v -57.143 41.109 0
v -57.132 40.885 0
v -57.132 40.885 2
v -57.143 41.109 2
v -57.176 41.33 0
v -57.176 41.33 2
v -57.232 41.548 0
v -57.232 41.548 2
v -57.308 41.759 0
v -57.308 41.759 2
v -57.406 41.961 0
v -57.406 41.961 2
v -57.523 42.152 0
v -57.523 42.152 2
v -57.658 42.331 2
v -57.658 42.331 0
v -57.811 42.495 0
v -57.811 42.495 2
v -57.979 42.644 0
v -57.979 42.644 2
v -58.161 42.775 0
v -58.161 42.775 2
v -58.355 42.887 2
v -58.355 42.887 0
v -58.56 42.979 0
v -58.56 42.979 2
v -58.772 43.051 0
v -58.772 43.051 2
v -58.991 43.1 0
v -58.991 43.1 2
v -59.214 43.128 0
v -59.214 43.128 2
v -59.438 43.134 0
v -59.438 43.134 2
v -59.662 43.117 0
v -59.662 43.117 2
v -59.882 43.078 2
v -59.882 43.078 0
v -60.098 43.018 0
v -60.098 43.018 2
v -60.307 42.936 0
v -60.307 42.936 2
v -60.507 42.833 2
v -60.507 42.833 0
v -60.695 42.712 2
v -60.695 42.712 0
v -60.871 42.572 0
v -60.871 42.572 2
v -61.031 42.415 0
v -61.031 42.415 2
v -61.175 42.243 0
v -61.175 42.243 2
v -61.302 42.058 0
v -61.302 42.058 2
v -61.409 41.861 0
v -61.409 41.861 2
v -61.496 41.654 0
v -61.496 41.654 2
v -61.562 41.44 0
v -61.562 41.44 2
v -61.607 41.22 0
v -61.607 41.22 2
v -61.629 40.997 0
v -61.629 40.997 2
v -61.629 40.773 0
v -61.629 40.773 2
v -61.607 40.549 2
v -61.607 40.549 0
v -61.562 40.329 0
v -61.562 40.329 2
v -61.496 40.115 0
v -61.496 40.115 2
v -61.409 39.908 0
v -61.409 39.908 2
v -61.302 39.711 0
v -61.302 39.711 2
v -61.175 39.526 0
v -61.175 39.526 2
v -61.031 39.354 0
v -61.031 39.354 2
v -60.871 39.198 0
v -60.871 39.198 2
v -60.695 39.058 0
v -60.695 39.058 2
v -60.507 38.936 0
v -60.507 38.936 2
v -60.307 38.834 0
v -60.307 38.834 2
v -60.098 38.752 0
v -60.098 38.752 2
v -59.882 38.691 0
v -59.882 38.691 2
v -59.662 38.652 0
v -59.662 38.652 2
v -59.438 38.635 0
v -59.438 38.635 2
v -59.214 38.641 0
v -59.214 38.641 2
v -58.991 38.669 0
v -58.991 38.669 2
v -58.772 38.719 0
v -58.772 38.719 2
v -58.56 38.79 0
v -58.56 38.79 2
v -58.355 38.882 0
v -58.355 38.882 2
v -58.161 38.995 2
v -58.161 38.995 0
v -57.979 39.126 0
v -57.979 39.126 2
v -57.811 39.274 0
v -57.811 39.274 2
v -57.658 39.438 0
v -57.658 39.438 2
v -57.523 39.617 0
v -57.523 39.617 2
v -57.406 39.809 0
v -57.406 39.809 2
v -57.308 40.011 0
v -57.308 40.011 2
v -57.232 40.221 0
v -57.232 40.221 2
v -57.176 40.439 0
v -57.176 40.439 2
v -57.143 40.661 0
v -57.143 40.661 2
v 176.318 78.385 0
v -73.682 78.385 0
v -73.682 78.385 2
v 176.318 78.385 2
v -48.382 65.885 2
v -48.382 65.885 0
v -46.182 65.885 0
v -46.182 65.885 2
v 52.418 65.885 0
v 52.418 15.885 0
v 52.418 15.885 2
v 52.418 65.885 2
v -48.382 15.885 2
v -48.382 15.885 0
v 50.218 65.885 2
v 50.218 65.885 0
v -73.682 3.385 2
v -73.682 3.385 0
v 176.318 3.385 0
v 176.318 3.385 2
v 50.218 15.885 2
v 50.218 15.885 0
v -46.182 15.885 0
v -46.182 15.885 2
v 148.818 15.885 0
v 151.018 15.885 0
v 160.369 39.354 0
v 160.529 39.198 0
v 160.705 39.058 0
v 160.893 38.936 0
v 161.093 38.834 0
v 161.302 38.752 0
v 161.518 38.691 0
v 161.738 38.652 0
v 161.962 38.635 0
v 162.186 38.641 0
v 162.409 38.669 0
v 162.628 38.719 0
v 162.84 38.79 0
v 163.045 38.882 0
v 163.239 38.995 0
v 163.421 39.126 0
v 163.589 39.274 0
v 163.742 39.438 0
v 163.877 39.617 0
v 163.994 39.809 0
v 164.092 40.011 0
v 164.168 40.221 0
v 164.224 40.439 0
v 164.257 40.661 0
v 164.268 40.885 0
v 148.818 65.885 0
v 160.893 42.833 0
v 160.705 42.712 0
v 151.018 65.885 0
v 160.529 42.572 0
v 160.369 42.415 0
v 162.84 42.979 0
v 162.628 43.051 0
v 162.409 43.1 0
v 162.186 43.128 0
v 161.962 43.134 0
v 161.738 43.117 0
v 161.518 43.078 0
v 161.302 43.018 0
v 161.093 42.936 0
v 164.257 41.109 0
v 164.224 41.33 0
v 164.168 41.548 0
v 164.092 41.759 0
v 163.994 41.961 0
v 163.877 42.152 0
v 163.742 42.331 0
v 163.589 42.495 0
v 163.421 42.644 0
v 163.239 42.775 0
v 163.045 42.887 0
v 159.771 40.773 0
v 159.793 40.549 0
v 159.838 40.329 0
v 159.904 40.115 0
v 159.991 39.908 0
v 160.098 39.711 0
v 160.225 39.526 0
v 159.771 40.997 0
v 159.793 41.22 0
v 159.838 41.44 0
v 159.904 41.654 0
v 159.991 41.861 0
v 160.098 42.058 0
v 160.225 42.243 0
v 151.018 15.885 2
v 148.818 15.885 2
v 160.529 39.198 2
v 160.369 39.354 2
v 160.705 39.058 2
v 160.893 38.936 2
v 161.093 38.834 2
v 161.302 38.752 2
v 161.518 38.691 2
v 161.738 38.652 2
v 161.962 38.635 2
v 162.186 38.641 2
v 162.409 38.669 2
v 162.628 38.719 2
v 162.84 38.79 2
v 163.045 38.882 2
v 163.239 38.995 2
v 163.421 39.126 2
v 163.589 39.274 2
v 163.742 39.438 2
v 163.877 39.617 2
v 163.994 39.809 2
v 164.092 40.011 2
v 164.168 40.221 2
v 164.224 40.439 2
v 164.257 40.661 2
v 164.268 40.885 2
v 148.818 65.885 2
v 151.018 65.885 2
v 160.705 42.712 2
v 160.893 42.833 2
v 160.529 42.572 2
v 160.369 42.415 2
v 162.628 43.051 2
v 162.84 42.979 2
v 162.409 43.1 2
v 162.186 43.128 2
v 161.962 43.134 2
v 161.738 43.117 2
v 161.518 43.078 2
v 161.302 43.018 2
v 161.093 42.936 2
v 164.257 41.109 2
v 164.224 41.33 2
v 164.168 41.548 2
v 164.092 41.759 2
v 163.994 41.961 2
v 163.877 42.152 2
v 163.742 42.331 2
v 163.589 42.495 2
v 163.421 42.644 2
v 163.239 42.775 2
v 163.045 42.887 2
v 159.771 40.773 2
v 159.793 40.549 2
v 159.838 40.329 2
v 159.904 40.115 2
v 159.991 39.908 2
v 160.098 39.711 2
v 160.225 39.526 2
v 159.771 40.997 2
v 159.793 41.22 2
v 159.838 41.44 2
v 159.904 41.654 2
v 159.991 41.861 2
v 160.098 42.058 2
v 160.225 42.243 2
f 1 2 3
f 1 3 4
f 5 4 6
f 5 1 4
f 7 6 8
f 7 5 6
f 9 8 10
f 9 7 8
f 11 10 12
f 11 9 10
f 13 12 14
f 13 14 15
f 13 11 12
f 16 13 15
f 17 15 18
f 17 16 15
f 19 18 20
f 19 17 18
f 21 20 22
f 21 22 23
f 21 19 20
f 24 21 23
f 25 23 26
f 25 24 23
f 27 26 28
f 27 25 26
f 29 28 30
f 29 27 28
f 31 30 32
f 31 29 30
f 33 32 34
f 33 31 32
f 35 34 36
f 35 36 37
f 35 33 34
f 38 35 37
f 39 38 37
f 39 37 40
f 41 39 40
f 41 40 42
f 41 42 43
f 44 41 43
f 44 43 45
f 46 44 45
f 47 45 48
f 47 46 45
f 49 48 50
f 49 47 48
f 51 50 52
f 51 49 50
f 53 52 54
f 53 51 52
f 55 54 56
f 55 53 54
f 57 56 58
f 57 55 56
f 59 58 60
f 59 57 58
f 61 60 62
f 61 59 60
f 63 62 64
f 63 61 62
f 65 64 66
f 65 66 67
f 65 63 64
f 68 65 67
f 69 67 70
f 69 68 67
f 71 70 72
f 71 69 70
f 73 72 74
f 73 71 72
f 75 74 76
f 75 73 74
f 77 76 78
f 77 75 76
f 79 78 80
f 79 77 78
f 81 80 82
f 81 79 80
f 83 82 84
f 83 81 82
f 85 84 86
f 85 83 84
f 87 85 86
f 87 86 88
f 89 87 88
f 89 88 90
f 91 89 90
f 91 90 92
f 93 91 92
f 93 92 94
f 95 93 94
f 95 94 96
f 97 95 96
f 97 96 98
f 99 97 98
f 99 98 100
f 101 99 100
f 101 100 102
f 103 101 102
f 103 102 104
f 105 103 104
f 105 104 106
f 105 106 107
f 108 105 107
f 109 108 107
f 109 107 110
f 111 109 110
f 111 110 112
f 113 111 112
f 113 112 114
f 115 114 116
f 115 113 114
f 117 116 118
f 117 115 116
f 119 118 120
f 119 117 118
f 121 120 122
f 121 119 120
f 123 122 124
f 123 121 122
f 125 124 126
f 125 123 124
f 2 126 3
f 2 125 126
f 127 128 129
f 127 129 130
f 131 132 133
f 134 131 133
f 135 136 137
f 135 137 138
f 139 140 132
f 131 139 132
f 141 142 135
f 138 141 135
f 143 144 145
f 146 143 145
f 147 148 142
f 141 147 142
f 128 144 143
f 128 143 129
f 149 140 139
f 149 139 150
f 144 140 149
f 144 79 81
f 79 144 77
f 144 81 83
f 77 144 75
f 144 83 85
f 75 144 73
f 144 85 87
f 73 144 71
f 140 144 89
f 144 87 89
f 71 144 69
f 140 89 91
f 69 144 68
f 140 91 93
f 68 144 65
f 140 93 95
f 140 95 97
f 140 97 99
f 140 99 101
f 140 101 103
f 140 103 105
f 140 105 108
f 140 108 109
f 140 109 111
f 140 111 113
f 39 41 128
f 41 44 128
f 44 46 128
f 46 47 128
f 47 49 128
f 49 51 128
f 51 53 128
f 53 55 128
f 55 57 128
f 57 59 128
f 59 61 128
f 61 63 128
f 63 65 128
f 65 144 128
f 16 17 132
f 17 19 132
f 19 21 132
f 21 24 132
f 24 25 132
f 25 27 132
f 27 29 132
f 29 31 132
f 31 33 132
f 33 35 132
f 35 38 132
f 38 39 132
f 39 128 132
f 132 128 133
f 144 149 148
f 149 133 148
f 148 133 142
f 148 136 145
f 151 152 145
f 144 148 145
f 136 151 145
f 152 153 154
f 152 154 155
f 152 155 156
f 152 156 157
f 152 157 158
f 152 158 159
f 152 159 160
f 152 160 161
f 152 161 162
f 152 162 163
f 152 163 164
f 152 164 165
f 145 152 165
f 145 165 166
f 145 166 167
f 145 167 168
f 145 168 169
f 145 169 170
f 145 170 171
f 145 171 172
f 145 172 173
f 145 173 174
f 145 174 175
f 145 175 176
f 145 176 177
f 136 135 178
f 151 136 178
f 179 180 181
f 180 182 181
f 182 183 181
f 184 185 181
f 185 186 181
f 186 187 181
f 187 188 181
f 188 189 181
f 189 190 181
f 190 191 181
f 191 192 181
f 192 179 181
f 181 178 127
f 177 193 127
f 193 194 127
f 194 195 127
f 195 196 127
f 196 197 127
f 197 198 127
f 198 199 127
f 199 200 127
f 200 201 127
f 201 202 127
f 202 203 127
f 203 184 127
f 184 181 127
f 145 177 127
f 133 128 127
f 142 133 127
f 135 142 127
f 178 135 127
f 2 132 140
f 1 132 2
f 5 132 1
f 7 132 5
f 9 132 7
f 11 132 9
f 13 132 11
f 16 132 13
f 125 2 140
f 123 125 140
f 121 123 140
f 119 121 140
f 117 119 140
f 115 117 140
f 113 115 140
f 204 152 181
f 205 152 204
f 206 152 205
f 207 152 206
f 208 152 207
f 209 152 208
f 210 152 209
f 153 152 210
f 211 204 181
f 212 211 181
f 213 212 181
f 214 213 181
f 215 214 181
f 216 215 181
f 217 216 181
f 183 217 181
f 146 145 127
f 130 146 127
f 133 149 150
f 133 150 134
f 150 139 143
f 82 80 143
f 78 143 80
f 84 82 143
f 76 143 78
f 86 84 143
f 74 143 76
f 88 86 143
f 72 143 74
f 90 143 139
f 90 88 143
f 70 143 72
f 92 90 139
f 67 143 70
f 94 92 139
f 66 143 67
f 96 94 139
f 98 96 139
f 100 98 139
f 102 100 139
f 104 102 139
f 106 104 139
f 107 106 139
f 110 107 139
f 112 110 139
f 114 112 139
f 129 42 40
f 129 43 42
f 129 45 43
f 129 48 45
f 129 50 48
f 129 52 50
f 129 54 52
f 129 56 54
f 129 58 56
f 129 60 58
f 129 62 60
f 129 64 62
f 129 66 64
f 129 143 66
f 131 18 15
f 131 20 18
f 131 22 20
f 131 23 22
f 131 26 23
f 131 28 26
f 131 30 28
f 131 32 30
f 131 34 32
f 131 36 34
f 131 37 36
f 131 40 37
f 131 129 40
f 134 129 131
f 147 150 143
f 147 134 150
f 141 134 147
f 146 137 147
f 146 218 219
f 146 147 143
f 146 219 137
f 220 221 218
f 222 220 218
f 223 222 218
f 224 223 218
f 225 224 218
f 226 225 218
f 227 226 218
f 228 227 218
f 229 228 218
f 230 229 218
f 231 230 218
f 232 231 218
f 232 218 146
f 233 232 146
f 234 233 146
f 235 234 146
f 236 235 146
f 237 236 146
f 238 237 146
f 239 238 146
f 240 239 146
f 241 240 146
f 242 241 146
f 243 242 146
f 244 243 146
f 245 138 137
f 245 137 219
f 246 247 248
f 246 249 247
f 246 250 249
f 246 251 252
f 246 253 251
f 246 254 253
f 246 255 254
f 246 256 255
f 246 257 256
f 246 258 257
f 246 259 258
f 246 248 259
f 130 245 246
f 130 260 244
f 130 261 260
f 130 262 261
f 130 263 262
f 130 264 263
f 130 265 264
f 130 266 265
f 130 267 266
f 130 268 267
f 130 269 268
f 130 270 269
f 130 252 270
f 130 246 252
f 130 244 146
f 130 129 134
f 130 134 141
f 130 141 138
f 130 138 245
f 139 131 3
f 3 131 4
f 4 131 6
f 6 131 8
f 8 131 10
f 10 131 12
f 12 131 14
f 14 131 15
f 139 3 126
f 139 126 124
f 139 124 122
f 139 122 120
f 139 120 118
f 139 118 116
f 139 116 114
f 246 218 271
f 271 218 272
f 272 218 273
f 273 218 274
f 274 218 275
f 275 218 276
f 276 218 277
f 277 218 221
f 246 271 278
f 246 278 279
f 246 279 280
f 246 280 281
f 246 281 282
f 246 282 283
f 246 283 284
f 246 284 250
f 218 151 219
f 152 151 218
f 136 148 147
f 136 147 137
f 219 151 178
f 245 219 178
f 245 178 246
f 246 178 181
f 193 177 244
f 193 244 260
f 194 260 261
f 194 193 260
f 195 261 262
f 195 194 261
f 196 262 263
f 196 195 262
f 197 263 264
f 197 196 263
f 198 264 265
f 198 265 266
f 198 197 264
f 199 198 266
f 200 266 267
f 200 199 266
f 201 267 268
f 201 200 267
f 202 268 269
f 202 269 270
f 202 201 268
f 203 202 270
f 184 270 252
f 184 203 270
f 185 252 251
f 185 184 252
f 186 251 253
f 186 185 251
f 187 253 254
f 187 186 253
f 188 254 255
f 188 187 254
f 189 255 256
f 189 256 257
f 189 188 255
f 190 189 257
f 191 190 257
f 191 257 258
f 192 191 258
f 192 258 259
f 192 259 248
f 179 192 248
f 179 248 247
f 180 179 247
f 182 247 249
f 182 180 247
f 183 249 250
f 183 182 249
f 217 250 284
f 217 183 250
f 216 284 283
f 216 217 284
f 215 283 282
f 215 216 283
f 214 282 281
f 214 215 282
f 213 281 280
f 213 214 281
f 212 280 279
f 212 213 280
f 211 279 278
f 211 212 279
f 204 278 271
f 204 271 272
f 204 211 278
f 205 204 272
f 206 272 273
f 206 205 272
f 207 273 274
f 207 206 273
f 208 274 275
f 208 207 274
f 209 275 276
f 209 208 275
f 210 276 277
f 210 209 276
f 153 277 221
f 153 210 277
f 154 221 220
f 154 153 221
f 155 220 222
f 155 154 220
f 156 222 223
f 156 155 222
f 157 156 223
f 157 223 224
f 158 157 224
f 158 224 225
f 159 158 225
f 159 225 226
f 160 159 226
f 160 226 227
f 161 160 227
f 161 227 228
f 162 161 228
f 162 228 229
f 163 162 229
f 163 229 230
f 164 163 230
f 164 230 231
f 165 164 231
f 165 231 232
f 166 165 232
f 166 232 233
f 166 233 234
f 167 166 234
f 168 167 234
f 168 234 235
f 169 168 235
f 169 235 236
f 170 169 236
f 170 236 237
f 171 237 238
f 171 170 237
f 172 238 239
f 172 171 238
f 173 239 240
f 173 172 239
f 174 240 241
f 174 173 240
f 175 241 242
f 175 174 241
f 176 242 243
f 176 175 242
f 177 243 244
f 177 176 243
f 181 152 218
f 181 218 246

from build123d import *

# Parameters (mm, degrees)
SKETCH_2_W               = 250
SKETCH_2_H               = 75
EXTRUDE_3_DEPTH          = 2
CUT_EXTRUDE_1_DEPTH      = 2
CUT_EXTRUDE_1_DEPTH_BACK = 2
SKETCH_4_W               = 2.2
SKETCH_4_H               = 50
CUT_EXTRUDE_2_DEPTH      = 2
CUT_EXTRUDE_2_DEPTH_BACK = 10
SKETCH_5_R               = 2.25


with BuildPart() as part:
    # 草图2 → 凸台-拉伸3 (new body)
    with BuildSketch(Plane.XY):
        with Locations((51.318241286, 40.884671024)):
            Rectangle(SKETCH_2_W, SKETCH_2_H)
    extrude(amount=EXTRUDE_3_DEPTH)

    # 草图4 → 切除-拉伸1 (cut, two sides: drawn at the far end of the back side and taken through both)
    with BuildSketch(Plane.XY.offset(-CUT_EXTRUDE_1_DEPTH_BACK)):
        with Locations((149.918241286, 40.884671024)):
            Rectangle(SKETCH_4_W, SKETCH_4_H)
        with Locations((-47.281758714, 40.884671024)):
            Rectangle(SKETCH_4_W, SKETCH_4_H)
        with Locations((51.318241286, 40.884671024)):
            Rectangle(SKETCH_4_W, SKETCH_4_H)
    extrude(amount=CUT_EXTRUDE_1_DEPTH + CUT_EXTRUDE_1_DEPTH_BACK, mode=Mode.SUBTRACT)

    # 草图5 → 切除-拉伸2 (cut, two sides: drawn at the far end of the back side and taken through both)
    with BuildSketch(Plane.XY.offset(-CUT_EXTRUDE_2_DEPTH_BACK)):
        with Locations((-59.381758714, 40.884671024)):
            Circle(SKETCH_5_R)
        with Locations((162.018241286, 40.884671024)):
            Circle(SKETCH_5_R)
    extrude(amount=CUT_EXTRUDE_2_DEPTH + CUT_EXTRUDE_2_DEPTH_BACK, mode=Mode.SUBTRACT)


solid = part.part
